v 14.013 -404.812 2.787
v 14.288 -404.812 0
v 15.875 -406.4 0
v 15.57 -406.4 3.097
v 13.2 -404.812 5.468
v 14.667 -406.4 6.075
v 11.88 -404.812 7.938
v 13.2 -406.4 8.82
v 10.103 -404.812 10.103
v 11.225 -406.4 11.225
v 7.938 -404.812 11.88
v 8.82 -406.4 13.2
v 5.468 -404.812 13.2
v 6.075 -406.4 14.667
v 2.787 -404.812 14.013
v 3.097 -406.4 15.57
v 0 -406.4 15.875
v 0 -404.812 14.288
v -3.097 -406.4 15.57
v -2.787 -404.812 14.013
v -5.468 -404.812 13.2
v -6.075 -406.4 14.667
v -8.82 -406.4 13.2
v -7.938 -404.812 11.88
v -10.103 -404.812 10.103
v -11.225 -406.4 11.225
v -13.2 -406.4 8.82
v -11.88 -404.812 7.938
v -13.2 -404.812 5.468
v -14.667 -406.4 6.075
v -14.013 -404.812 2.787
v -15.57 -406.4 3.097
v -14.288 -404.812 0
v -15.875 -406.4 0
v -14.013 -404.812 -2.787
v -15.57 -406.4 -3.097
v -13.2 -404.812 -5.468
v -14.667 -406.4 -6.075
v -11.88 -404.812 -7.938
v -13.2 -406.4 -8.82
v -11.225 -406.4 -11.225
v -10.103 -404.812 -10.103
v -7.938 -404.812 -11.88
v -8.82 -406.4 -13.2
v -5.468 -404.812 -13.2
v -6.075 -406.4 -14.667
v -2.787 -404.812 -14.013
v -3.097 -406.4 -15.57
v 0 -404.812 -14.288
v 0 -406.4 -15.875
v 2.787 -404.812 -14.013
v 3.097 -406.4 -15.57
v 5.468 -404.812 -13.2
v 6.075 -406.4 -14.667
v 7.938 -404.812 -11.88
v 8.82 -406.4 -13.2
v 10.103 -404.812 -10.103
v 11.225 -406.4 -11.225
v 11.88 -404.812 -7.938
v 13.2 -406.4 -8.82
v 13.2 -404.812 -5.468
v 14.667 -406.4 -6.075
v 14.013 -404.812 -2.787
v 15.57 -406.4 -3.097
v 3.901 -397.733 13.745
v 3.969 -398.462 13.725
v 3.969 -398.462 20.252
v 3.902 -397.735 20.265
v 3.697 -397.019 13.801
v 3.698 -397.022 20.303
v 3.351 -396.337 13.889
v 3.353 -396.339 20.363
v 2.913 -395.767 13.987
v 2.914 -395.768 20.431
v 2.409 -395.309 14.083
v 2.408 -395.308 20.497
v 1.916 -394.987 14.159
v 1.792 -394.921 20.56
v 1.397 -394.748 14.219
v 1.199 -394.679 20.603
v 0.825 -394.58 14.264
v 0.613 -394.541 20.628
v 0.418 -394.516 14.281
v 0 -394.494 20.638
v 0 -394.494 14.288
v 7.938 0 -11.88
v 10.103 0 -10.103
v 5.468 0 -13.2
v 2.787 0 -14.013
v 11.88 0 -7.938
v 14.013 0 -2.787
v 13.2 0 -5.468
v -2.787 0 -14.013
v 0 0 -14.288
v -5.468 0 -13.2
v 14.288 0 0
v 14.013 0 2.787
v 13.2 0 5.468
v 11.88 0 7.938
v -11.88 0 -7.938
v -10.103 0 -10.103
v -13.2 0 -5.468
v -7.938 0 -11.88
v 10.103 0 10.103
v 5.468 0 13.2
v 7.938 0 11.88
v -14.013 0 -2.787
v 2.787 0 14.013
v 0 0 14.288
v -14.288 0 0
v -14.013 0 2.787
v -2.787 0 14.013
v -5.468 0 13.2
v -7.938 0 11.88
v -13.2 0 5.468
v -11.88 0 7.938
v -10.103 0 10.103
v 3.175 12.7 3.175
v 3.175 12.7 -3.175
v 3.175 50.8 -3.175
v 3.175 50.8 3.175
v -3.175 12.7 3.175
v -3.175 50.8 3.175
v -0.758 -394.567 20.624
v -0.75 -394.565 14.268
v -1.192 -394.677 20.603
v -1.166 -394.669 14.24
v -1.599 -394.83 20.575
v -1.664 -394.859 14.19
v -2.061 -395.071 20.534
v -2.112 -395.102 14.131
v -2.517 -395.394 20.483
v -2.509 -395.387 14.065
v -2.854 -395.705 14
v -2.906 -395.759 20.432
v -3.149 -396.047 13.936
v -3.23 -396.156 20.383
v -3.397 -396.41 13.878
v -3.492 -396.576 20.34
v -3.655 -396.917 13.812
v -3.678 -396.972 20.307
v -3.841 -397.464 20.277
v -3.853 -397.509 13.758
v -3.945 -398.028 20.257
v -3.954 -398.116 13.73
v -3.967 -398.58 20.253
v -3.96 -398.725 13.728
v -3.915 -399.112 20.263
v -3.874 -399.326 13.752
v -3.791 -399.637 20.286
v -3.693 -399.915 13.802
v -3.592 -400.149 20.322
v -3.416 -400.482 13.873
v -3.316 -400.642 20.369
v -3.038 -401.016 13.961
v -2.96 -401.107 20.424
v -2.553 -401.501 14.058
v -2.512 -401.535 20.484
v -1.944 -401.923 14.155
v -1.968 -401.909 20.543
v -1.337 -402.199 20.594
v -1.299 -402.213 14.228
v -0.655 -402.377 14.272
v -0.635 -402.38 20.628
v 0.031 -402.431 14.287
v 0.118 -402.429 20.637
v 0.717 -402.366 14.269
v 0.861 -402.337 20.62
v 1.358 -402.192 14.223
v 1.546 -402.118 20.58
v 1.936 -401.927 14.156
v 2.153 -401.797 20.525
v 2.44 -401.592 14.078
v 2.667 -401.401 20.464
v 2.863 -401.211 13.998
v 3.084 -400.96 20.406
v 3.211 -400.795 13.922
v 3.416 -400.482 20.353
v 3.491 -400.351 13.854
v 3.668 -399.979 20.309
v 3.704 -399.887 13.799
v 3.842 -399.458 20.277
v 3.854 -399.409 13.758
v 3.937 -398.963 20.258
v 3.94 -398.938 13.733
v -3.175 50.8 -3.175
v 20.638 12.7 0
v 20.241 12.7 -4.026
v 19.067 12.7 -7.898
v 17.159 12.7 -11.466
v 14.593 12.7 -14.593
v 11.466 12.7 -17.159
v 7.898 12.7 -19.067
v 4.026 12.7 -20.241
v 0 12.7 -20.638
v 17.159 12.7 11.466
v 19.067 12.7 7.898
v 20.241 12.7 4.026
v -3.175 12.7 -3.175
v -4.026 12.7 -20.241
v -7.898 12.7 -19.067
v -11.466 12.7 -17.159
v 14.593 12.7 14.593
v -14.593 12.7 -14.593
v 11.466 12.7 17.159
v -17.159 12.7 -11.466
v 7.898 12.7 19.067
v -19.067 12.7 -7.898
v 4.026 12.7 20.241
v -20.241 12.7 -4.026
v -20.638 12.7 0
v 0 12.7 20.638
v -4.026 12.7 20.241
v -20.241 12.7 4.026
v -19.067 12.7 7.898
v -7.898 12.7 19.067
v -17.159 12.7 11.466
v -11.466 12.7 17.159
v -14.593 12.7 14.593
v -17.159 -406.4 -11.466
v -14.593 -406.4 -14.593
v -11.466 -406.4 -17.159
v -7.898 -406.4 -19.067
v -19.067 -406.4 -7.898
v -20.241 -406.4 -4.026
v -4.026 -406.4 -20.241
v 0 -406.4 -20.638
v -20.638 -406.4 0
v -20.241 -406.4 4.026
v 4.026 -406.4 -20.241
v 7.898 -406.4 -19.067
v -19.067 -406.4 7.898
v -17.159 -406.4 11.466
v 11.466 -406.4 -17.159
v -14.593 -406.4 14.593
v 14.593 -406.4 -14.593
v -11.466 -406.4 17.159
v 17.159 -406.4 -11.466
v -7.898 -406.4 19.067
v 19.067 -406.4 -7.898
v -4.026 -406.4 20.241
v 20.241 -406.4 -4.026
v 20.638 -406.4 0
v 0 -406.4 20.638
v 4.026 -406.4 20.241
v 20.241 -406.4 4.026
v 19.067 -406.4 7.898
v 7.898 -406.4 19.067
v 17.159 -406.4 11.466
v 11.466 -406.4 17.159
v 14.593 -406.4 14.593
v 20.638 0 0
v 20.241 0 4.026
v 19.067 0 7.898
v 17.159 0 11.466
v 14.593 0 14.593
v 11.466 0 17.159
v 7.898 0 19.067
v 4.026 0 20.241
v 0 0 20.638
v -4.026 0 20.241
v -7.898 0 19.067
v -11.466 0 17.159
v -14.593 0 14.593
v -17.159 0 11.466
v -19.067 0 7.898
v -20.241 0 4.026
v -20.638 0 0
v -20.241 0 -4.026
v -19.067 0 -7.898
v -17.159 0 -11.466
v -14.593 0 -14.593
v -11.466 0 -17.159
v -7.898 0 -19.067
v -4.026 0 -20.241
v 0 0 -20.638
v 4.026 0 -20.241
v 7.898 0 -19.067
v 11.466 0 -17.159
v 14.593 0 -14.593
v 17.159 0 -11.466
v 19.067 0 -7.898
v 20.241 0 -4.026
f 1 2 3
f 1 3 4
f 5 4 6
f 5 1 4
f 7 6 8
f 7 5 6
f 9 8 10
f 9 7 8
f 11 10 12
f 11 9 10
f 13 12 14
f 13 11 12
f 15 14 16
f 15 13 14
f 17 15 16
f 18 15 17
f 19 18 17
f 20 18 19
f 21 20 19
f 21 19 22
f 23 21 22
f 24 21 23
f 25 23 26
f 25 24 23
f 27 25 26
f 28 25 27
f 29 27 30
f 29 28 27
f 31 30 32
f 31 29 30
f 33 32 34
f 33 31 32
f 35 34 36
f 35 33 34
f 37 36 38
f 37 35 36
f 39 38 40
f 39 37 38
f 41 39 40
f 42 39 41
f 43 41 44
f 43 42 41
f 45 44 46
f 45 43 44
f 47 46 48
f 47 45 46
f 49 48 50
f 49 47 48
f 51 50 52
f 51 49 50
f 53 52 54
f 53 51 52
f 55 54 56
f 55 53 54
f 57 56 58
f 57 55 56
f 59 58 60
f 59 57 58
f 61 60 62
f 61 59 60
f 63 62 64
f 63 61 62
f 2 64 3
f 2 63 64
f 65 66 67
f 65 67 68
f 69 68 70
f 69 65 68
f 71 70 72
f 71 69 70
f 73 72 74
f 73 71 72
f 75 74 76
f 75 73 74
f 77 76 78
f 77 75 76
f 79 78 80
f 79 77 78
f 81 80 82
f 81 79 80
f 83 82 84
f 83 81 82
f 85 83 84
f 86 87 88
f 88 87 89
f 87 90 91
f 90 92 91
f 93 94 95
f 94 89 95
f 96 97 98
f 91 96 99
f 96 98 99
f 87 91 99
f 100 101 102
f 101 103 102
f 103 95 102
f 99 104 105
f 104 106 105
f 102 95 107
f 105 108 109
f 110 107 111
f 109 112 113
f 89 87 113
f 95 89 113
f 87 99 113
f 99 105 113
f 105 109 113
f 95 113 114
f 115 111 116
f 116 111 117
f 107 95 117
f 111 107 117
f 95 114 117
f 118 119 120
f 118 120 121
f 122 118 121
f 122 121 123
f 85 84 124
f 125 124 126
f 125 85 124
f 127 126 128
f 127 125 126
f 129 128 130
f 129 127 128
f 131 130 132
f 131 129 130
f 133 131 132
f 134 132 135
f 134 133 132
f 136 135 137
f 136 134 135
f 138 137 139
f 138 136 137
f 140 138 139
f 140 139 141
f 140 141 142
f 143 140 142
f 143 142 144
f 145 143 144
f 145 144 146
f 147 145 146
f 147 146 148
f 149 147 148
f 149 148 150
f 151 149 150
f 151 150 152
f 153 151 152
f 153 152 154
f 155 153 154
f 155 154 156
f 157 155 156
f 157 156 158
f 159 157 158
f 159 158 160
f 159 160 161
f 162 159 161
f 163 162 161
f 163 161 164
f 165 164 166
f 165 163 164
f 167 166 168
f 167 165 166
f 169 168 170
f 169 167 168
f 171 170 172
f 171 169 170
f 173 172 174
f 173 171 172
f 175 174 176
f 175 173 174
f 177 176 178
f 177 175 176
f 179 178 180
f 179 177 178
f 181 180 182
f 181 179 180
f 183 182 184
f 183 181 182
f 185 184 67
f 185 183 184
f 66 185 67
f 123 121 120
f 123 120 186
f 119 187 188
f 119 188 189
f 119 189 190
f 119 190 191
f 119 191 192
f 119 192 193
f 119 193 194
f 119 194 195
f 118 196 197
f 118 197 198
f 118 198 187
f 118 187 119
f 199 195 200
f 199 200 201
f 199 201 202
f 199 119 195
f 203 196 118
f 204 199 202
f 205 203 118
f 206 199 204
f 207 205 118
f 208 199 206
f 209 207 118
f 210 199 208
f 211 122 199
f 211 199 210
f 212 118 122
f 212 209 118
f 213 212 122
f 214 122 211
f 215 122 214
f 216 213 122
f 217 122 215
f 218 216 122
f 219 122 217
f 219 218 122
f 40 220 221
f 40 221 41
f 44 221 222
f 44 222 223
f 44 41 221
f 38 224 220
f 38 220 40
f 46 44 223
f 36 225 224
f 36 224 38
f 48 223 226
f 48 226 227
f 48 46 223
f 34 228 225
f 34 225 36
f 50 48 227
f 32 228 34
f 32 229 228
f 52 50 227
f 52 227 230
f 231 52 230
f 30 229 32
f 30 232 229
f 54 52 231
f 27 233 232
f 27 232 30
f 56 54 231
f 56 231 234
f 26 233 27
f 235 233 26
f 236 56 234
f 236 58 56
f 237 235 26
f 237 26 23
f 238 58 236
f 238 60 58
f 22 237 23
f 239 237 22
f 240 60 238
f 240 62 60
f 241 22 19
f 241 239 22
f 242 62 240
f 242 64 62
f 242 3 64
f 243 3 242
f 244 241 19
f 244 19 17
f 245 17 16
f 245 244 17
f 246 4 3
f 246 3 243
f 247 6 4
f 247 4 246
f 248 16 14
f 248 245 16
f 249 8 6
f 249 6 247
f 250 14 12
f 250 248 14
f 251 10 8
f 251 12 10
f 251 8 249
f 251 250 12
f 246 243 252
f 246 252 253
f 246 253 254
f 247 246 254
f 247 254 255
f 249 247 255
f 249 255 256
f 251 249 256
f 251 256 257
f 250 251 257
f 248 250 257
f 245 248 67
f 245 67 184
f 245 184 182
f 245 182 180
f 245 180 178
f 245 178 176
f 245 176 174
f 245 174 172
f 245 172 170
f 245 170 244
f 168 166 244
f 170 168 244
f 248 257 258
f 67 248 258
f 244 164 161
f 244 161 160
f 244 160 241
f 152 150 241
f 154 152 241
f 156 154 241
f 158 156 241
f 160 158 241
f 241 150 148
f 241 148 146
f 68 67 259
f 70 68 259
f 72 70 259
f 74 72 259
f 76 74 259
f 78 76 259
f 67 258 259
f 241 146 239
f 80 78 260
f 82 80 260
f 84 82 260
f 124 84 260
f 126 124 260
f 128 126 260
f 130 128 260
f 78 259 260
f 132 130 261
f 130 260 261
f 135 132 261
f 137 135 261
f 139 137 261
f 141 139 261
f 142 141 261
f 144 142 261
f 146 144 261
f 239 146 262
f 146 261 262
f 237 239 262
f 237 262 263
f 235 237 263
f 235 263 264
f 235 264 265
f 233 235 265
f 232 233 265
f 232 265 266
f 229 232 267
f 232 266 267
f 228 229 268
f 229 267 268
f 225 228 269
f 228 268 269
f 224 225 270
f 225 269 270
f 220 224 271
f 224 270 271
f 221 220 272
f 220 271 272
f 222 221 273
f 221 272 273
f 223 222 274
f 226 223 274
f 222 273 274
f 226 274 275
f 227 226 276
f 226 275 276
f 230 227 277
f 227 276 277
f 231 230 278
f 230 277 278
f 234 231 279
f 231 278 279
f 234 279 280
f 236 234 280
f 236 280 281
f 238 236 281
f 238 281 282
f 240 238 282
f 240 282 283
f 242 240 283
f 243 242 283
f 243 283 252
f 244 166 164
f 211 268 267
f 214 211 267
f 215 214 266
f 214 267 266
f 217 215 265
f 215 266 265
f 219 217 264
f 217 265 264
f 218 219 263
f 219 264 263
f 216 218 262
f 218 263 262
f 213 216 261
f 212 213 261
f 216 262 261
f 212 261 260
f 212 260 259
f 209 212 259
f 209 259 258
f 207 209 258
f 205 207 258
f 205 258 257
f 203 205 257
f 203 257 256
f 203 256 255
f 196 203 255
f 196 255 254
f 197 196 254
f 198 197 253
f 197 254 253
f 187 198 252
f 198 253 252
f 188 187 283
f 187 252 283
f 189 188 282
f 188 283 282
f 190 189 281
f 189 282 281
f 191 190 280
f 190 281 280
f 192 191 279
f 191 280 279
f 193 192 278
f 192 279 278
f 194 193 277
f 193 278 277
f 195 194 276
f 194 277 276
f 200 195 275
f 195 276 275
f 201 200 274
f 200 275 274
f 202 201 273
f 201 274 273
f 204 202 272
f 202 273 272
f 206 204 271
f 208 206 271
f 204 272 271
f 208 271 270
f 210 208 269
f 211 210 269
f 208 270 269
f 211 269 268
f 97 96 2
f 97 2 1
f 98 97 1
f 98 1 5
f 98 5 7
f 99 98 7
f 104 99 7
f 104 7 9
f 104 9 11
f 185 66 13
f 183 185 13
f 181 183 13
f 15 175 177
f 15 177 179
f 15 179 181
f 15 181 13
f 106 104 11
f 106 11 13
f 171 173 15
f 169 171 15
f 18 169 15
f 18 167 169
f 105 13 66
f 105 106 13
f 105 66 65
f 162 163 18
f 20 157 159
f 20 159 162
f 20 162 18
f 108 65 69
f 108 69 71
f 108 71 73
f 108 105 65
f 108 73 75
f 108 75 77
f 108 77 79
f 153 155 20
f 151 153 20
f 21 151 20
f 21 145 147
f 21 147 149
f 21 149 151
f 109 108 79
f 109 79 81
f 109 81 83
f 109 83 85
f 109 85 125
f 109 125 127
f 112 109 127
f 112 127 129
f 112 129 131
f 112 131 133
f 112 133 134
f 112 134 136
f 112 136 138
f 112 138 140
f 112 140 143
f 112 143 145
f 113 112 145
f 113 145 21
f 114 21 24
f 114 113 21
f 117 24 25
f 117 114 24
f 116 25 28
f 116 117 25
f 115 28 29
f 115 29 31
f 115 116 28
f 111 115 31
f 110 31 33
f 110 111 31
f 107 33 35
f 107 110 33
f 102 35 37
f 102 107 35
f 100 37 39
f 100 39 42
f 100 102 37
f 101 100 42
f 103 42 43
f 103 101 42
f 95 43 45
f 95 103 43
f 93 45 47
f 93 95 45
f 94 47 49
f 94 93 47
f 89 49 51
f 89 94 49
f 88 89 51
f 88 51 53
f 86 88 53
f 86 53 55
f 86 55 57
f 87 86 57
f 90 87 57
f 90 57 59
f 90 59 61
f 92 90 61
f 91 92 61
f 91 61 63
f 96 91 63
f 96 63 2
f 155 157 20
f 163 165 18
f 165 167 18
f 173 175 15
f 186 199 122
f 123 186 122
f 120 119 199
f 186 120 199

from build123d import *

# Parameters (mm, degrees)
F0_R     = 20.6375
F0_R_2   = 14.2875
F1_DEPTH = 406.4
F2_R     = 20.6375
F3_DEPTH = 12.7
F4_W     = 6.35
F4_H     = 6.35
F5_DEPTH = 38.1
F7_DEPTH = 25.4
F8_SIZE  = 1.5875


with BuildPart() as f1:
    # F0 (on Front) → F1 (new body)
    with BuildSketch(Plane.XZ):
        Circle(F0_R)
        Circle(F0_R_2, mode=Mode.SUBTRACT)
    extrude(amount=F1_DEPTH)

    # F2 (on face) → F3 (join)
    with BuildSketch(Plane(origin=(0, 0, 0), x_dir=(-1, 0, 0), z_dir=(0, 1, 0))):
        Circle(F2_R)
    extrude(amount=F3_DEPTH)

    # F4 (on face) → F5 (join)
    with BuildSketch(Plane(origin=(0, 12.7, 0), x_dir=(-1, 0, 0), z_dir=(0, 1, 0))):
        Rectangle(F4_W, F4_H)
    extrude(amount=F5_DEPTH)

    # F6 (on Top) → F7 (cut)
    with BuildSketch(Plane.XY):
        with BuildLine():
            ThreePointArc((0, -394.49375), (-2.80633, -401.26883), (3.96875, -398.4625))
            ThreePointArc((3.96875, -398.4625), (2.80633, -395.65617), (0, -394.49375))
        make_face()
    extrude(amount=F7_DEPTH, mode=Mode.SUBTRACT)

    # F8
    f8_edges = [f1.edges().sort_by_distance(p)[0] for p in [
        (-14.2875, -406.4, 0),
    ]]
    chamfer(f8_edges, length=F8_SIZE)


solid = f1.part
